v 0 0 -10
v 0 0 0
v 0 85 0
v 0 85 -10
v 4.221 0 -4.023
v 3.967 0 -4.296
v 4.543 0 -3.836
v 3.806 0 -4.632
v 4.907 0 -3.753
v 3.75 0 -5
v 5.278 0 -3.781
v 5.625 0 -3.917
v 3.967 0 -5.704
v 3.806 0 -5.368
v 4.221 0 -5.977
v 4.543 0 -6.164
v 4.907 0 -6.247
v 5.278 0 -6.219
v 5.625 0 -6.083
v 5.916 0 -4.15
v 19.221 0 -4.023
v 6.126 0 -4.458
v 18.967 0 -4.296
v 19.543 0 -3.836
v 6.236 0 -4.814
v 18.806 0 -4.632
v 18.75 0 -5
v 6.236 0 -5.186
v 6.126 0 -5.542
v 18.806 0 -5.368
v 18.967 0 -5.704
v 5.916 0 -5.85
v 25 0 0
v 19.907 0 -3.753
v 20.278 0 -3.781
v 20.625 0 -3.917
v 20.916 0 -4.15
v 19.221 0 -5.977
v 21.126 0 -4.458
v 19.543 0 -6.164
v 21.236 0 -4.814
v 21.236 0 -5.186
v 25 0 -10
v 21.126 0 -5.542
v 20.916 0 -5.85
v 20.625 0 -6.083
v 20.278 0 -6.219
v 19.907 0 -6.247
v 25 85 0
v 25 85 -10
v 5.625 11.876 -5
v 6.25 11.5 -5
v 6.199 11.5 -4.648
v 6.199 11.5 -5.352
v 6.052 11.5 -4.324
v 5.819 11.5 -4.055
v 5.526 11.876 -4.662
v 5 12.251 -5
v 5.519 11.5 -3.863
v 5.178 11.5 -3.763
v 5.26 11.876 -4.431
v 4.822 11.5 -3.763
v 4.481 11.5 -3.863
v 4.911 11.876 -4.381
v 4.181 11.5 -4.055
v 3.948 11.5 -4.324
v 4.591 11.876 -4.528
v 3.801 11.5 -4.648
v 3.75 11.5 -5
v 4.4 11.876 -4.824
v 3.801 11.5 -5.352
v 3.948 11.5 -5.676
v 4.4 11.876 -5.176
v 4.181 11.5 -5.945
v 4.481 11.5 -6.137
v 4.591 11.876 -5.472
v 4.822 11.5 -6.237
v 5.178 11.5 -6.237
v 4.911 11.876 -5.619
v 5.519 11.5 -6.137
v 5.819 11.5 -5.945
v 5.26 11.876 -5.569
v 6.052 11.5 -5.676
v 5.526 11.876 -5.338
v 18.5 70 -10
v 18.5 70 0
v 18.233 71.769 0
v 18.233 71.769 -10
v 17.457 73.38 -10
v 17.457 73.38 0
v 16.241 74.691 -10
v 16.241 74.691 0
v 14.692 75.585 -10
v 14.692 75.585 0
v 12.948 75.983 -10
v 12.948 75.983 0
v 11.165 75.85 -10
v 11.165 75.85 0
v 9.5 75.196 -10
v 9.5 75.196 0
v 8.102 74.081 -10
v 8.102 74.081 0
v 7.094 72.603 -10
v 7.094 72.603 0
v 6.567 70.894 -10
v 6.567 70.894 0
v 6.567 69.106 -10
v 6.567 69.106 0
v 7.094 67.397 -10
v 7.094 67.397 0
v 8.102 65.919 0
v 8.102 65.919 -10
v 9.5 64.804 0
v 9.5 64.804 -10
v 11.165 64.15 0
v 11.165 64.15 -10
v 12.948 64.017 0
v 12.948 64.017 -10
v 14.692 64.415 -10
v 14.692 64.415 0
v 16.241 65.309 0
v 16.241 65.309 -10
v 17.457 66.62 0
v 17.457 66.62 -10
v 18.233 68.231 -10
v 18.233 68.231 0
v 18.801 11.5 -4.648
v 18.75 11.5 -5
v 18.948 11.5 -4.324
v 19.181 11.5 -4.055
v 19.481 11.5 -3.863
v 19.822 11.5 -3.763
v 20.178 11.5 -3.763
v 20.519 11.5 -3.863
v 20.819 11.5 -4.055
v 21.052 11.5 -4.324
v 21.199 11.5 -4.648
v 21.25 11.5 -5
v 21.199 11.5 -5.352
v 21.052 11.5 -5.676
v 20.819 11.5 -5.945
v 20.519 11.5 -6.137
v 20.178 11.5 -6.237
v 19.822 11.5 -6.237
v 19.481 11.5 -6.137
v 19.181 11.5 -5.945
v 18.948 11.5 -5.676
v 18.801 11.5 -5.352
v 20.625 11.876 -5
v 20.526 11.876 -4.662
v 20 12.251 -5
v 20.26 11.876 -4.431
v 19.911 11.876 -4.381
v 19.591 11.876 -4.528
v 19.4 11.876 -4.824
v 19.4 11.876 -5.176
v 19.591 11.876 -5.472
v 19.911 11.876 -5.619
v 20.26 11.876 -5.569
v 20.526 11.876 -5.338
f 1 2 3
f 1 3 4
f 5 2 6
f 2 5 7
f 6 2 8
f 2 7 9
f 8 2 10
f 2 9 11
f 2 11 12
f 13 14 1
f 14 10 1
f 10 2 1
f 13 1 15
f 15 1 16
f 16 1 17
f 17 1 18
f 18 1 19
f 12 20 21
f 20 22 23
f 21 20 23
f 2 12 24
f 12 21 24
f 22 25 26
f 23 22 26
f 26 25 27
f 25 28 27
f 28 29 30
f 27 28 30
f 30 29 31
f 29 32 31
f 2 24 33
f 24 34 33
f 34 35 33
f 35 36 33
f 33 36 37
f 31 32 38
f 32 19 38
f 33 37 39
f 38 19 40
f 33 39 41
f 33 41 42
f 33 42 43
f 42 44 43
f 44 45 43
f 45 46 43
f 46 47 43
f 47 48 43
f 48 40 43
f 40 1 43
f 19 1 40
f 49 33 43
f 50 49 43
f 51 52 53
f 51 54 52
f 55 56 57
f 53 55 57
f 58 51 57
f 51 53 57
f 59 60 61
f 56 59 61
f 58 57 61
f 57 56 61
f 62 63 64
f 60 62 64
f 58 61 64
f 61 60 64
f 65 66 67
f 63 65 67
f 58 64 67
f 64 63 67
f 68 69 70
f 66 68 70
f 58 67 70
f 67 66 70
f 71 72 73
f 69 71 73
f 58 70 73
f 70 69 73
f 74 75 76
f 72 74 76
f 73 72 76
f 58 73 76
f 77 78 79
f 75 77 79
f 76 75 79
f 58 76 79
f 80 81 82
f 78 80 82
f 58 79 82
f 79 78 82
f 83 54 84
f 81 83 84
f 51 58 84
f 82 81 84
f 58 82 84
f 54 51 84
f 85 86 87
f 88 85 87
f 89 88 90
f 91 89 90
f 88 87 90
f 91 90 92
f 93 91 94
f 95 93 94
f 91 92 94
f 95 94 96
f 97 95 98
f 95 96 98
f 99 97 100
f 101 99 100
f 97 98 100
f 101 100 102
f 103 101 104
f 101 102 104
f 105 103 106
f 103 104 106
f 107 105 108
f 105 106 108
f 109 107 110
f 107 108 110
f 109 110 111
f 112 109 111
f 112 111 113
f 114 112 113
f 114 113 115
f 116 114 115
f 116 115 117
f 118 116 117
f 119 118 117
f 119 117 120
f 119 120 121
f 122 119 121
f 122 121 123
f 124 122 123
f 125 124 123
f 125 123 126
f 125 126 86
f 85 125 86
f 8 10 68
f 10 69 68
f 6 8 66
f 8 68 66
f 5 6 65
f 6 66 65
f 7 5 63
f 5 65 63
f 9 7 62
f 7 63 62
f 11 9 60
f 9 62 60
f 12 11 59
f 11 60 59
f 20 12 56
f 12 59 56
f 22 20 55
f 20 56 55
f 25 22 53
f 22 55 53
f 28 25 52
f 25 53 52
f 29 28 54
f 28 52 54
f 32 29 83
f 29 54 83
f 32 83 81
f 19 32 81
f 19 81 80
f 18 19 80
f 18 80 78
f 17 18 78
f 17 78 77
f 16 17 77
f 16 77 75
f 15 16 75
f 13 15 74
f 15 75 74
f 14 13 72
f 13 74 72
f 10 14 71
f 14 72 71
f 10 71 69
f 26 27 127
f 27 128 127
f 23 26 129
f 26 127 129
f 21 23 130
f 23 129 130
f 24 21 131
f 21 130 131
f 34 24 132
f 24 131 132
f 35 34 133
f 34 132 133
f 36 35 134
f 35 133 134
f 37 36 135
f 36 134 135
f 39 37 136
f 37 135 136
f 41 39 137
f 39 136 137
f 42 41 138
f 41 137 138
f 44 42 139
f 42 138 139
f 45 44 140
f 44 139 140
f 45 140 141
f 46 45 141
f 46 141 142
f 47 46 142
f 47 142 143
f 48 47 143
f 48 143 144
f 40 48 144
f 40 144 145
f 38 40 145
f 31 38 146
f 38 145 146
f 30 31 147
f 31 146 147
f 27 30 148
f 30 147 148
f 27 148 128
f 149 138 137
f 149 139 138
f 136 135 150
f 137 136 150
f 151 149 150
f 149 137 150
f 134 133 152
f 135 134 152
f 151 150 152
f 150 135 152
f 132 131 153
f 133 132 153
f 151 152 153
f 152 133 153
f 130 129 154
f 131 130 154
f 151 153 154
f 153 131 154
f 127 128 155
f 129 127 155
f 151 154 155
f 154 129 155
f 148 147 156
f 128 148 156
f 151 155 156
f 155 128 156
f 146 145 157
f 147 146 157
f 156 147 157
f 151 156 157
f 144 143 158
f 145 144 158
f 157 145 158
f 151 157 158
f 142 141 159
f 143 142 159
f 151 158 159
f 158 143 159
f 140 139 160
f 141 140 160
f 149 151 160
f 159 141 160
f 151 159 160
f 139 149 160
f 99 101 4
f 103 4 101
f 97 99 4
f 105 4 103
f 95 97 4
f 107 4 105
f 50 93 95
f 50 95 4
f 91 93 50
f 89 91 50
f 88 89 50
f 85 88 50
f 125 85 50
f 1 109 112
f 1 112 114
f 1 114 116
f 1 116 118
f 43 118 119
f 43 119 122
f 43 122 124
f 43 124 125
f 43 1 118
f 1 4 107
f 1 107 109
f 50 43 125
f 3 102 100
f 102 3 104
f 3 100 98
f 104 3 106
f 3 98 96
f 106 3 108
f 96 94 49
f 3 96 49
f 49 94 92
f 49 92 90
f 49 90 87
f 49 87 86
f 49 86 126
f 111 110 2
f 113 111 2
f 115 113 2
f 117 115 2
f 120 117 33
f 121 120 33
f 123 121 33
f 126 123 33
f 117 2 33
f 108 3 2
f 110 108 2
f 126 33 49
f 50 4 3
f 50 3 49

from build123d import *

# Parameters (mm, degrees)
SKETCH_1_W          = 25
SKETCH_1_H          = 10
EXTRUDE_1_DEPTH     = 85
SKETCH_2_R          = 6
CUT_EXTRUDE_1_DEPTH = 90.162772501
M3X0_5_1_D          = 2.5
M3X0_5_1_DEPTH      = 11.5
M3X0_5_1_TIP        = 0.751075774


with BuildPart() as part:
    # ｽｹｯﾁ1 → ﾎﾞｽ - 押し出し1 (new body)
    with BuildSketch(Plane(origin=(0, 0, 0), x_dir=(1, 0, 0), z_dir=(0, 1, 0))):
        with Locations((12.5, 5)):
            Rectangle(SKETCH_1_W, SKETCH_1_H)
    extrude(amount=EXTRUDE_1_DEPTH)

    # ｽｹｯﾁ2 → ｶｯﾄ - 押し出し1 (cut, through all)
    with BuildSketch(Plane.XY):
        with Locations((12.5, 70)):
            Circle(SKETCH_2_R)
    extrude(amount=-CUT_EXTRUDE_1_DEPTH, mode=Mode.SUBTRACT)

    # M3x0.5 ねじ穴1
    with Locations(Plane.XZ):
        with Locations((20, -5), (5, -5)):
            Hole(M3X0_5_1_D / 2, depth=M3X0_5_1_DEPTH)
            with Locations((0, 0, -(M3X0_5_1_DEPTH + M3X0_5_1_TIP / 2))):  # 118° drill point
                Cone(0, M3X0_5_1_D / 2, M3X0_5_1_TIP, mode=Mode.SUBTRACT)


solid = part.part
